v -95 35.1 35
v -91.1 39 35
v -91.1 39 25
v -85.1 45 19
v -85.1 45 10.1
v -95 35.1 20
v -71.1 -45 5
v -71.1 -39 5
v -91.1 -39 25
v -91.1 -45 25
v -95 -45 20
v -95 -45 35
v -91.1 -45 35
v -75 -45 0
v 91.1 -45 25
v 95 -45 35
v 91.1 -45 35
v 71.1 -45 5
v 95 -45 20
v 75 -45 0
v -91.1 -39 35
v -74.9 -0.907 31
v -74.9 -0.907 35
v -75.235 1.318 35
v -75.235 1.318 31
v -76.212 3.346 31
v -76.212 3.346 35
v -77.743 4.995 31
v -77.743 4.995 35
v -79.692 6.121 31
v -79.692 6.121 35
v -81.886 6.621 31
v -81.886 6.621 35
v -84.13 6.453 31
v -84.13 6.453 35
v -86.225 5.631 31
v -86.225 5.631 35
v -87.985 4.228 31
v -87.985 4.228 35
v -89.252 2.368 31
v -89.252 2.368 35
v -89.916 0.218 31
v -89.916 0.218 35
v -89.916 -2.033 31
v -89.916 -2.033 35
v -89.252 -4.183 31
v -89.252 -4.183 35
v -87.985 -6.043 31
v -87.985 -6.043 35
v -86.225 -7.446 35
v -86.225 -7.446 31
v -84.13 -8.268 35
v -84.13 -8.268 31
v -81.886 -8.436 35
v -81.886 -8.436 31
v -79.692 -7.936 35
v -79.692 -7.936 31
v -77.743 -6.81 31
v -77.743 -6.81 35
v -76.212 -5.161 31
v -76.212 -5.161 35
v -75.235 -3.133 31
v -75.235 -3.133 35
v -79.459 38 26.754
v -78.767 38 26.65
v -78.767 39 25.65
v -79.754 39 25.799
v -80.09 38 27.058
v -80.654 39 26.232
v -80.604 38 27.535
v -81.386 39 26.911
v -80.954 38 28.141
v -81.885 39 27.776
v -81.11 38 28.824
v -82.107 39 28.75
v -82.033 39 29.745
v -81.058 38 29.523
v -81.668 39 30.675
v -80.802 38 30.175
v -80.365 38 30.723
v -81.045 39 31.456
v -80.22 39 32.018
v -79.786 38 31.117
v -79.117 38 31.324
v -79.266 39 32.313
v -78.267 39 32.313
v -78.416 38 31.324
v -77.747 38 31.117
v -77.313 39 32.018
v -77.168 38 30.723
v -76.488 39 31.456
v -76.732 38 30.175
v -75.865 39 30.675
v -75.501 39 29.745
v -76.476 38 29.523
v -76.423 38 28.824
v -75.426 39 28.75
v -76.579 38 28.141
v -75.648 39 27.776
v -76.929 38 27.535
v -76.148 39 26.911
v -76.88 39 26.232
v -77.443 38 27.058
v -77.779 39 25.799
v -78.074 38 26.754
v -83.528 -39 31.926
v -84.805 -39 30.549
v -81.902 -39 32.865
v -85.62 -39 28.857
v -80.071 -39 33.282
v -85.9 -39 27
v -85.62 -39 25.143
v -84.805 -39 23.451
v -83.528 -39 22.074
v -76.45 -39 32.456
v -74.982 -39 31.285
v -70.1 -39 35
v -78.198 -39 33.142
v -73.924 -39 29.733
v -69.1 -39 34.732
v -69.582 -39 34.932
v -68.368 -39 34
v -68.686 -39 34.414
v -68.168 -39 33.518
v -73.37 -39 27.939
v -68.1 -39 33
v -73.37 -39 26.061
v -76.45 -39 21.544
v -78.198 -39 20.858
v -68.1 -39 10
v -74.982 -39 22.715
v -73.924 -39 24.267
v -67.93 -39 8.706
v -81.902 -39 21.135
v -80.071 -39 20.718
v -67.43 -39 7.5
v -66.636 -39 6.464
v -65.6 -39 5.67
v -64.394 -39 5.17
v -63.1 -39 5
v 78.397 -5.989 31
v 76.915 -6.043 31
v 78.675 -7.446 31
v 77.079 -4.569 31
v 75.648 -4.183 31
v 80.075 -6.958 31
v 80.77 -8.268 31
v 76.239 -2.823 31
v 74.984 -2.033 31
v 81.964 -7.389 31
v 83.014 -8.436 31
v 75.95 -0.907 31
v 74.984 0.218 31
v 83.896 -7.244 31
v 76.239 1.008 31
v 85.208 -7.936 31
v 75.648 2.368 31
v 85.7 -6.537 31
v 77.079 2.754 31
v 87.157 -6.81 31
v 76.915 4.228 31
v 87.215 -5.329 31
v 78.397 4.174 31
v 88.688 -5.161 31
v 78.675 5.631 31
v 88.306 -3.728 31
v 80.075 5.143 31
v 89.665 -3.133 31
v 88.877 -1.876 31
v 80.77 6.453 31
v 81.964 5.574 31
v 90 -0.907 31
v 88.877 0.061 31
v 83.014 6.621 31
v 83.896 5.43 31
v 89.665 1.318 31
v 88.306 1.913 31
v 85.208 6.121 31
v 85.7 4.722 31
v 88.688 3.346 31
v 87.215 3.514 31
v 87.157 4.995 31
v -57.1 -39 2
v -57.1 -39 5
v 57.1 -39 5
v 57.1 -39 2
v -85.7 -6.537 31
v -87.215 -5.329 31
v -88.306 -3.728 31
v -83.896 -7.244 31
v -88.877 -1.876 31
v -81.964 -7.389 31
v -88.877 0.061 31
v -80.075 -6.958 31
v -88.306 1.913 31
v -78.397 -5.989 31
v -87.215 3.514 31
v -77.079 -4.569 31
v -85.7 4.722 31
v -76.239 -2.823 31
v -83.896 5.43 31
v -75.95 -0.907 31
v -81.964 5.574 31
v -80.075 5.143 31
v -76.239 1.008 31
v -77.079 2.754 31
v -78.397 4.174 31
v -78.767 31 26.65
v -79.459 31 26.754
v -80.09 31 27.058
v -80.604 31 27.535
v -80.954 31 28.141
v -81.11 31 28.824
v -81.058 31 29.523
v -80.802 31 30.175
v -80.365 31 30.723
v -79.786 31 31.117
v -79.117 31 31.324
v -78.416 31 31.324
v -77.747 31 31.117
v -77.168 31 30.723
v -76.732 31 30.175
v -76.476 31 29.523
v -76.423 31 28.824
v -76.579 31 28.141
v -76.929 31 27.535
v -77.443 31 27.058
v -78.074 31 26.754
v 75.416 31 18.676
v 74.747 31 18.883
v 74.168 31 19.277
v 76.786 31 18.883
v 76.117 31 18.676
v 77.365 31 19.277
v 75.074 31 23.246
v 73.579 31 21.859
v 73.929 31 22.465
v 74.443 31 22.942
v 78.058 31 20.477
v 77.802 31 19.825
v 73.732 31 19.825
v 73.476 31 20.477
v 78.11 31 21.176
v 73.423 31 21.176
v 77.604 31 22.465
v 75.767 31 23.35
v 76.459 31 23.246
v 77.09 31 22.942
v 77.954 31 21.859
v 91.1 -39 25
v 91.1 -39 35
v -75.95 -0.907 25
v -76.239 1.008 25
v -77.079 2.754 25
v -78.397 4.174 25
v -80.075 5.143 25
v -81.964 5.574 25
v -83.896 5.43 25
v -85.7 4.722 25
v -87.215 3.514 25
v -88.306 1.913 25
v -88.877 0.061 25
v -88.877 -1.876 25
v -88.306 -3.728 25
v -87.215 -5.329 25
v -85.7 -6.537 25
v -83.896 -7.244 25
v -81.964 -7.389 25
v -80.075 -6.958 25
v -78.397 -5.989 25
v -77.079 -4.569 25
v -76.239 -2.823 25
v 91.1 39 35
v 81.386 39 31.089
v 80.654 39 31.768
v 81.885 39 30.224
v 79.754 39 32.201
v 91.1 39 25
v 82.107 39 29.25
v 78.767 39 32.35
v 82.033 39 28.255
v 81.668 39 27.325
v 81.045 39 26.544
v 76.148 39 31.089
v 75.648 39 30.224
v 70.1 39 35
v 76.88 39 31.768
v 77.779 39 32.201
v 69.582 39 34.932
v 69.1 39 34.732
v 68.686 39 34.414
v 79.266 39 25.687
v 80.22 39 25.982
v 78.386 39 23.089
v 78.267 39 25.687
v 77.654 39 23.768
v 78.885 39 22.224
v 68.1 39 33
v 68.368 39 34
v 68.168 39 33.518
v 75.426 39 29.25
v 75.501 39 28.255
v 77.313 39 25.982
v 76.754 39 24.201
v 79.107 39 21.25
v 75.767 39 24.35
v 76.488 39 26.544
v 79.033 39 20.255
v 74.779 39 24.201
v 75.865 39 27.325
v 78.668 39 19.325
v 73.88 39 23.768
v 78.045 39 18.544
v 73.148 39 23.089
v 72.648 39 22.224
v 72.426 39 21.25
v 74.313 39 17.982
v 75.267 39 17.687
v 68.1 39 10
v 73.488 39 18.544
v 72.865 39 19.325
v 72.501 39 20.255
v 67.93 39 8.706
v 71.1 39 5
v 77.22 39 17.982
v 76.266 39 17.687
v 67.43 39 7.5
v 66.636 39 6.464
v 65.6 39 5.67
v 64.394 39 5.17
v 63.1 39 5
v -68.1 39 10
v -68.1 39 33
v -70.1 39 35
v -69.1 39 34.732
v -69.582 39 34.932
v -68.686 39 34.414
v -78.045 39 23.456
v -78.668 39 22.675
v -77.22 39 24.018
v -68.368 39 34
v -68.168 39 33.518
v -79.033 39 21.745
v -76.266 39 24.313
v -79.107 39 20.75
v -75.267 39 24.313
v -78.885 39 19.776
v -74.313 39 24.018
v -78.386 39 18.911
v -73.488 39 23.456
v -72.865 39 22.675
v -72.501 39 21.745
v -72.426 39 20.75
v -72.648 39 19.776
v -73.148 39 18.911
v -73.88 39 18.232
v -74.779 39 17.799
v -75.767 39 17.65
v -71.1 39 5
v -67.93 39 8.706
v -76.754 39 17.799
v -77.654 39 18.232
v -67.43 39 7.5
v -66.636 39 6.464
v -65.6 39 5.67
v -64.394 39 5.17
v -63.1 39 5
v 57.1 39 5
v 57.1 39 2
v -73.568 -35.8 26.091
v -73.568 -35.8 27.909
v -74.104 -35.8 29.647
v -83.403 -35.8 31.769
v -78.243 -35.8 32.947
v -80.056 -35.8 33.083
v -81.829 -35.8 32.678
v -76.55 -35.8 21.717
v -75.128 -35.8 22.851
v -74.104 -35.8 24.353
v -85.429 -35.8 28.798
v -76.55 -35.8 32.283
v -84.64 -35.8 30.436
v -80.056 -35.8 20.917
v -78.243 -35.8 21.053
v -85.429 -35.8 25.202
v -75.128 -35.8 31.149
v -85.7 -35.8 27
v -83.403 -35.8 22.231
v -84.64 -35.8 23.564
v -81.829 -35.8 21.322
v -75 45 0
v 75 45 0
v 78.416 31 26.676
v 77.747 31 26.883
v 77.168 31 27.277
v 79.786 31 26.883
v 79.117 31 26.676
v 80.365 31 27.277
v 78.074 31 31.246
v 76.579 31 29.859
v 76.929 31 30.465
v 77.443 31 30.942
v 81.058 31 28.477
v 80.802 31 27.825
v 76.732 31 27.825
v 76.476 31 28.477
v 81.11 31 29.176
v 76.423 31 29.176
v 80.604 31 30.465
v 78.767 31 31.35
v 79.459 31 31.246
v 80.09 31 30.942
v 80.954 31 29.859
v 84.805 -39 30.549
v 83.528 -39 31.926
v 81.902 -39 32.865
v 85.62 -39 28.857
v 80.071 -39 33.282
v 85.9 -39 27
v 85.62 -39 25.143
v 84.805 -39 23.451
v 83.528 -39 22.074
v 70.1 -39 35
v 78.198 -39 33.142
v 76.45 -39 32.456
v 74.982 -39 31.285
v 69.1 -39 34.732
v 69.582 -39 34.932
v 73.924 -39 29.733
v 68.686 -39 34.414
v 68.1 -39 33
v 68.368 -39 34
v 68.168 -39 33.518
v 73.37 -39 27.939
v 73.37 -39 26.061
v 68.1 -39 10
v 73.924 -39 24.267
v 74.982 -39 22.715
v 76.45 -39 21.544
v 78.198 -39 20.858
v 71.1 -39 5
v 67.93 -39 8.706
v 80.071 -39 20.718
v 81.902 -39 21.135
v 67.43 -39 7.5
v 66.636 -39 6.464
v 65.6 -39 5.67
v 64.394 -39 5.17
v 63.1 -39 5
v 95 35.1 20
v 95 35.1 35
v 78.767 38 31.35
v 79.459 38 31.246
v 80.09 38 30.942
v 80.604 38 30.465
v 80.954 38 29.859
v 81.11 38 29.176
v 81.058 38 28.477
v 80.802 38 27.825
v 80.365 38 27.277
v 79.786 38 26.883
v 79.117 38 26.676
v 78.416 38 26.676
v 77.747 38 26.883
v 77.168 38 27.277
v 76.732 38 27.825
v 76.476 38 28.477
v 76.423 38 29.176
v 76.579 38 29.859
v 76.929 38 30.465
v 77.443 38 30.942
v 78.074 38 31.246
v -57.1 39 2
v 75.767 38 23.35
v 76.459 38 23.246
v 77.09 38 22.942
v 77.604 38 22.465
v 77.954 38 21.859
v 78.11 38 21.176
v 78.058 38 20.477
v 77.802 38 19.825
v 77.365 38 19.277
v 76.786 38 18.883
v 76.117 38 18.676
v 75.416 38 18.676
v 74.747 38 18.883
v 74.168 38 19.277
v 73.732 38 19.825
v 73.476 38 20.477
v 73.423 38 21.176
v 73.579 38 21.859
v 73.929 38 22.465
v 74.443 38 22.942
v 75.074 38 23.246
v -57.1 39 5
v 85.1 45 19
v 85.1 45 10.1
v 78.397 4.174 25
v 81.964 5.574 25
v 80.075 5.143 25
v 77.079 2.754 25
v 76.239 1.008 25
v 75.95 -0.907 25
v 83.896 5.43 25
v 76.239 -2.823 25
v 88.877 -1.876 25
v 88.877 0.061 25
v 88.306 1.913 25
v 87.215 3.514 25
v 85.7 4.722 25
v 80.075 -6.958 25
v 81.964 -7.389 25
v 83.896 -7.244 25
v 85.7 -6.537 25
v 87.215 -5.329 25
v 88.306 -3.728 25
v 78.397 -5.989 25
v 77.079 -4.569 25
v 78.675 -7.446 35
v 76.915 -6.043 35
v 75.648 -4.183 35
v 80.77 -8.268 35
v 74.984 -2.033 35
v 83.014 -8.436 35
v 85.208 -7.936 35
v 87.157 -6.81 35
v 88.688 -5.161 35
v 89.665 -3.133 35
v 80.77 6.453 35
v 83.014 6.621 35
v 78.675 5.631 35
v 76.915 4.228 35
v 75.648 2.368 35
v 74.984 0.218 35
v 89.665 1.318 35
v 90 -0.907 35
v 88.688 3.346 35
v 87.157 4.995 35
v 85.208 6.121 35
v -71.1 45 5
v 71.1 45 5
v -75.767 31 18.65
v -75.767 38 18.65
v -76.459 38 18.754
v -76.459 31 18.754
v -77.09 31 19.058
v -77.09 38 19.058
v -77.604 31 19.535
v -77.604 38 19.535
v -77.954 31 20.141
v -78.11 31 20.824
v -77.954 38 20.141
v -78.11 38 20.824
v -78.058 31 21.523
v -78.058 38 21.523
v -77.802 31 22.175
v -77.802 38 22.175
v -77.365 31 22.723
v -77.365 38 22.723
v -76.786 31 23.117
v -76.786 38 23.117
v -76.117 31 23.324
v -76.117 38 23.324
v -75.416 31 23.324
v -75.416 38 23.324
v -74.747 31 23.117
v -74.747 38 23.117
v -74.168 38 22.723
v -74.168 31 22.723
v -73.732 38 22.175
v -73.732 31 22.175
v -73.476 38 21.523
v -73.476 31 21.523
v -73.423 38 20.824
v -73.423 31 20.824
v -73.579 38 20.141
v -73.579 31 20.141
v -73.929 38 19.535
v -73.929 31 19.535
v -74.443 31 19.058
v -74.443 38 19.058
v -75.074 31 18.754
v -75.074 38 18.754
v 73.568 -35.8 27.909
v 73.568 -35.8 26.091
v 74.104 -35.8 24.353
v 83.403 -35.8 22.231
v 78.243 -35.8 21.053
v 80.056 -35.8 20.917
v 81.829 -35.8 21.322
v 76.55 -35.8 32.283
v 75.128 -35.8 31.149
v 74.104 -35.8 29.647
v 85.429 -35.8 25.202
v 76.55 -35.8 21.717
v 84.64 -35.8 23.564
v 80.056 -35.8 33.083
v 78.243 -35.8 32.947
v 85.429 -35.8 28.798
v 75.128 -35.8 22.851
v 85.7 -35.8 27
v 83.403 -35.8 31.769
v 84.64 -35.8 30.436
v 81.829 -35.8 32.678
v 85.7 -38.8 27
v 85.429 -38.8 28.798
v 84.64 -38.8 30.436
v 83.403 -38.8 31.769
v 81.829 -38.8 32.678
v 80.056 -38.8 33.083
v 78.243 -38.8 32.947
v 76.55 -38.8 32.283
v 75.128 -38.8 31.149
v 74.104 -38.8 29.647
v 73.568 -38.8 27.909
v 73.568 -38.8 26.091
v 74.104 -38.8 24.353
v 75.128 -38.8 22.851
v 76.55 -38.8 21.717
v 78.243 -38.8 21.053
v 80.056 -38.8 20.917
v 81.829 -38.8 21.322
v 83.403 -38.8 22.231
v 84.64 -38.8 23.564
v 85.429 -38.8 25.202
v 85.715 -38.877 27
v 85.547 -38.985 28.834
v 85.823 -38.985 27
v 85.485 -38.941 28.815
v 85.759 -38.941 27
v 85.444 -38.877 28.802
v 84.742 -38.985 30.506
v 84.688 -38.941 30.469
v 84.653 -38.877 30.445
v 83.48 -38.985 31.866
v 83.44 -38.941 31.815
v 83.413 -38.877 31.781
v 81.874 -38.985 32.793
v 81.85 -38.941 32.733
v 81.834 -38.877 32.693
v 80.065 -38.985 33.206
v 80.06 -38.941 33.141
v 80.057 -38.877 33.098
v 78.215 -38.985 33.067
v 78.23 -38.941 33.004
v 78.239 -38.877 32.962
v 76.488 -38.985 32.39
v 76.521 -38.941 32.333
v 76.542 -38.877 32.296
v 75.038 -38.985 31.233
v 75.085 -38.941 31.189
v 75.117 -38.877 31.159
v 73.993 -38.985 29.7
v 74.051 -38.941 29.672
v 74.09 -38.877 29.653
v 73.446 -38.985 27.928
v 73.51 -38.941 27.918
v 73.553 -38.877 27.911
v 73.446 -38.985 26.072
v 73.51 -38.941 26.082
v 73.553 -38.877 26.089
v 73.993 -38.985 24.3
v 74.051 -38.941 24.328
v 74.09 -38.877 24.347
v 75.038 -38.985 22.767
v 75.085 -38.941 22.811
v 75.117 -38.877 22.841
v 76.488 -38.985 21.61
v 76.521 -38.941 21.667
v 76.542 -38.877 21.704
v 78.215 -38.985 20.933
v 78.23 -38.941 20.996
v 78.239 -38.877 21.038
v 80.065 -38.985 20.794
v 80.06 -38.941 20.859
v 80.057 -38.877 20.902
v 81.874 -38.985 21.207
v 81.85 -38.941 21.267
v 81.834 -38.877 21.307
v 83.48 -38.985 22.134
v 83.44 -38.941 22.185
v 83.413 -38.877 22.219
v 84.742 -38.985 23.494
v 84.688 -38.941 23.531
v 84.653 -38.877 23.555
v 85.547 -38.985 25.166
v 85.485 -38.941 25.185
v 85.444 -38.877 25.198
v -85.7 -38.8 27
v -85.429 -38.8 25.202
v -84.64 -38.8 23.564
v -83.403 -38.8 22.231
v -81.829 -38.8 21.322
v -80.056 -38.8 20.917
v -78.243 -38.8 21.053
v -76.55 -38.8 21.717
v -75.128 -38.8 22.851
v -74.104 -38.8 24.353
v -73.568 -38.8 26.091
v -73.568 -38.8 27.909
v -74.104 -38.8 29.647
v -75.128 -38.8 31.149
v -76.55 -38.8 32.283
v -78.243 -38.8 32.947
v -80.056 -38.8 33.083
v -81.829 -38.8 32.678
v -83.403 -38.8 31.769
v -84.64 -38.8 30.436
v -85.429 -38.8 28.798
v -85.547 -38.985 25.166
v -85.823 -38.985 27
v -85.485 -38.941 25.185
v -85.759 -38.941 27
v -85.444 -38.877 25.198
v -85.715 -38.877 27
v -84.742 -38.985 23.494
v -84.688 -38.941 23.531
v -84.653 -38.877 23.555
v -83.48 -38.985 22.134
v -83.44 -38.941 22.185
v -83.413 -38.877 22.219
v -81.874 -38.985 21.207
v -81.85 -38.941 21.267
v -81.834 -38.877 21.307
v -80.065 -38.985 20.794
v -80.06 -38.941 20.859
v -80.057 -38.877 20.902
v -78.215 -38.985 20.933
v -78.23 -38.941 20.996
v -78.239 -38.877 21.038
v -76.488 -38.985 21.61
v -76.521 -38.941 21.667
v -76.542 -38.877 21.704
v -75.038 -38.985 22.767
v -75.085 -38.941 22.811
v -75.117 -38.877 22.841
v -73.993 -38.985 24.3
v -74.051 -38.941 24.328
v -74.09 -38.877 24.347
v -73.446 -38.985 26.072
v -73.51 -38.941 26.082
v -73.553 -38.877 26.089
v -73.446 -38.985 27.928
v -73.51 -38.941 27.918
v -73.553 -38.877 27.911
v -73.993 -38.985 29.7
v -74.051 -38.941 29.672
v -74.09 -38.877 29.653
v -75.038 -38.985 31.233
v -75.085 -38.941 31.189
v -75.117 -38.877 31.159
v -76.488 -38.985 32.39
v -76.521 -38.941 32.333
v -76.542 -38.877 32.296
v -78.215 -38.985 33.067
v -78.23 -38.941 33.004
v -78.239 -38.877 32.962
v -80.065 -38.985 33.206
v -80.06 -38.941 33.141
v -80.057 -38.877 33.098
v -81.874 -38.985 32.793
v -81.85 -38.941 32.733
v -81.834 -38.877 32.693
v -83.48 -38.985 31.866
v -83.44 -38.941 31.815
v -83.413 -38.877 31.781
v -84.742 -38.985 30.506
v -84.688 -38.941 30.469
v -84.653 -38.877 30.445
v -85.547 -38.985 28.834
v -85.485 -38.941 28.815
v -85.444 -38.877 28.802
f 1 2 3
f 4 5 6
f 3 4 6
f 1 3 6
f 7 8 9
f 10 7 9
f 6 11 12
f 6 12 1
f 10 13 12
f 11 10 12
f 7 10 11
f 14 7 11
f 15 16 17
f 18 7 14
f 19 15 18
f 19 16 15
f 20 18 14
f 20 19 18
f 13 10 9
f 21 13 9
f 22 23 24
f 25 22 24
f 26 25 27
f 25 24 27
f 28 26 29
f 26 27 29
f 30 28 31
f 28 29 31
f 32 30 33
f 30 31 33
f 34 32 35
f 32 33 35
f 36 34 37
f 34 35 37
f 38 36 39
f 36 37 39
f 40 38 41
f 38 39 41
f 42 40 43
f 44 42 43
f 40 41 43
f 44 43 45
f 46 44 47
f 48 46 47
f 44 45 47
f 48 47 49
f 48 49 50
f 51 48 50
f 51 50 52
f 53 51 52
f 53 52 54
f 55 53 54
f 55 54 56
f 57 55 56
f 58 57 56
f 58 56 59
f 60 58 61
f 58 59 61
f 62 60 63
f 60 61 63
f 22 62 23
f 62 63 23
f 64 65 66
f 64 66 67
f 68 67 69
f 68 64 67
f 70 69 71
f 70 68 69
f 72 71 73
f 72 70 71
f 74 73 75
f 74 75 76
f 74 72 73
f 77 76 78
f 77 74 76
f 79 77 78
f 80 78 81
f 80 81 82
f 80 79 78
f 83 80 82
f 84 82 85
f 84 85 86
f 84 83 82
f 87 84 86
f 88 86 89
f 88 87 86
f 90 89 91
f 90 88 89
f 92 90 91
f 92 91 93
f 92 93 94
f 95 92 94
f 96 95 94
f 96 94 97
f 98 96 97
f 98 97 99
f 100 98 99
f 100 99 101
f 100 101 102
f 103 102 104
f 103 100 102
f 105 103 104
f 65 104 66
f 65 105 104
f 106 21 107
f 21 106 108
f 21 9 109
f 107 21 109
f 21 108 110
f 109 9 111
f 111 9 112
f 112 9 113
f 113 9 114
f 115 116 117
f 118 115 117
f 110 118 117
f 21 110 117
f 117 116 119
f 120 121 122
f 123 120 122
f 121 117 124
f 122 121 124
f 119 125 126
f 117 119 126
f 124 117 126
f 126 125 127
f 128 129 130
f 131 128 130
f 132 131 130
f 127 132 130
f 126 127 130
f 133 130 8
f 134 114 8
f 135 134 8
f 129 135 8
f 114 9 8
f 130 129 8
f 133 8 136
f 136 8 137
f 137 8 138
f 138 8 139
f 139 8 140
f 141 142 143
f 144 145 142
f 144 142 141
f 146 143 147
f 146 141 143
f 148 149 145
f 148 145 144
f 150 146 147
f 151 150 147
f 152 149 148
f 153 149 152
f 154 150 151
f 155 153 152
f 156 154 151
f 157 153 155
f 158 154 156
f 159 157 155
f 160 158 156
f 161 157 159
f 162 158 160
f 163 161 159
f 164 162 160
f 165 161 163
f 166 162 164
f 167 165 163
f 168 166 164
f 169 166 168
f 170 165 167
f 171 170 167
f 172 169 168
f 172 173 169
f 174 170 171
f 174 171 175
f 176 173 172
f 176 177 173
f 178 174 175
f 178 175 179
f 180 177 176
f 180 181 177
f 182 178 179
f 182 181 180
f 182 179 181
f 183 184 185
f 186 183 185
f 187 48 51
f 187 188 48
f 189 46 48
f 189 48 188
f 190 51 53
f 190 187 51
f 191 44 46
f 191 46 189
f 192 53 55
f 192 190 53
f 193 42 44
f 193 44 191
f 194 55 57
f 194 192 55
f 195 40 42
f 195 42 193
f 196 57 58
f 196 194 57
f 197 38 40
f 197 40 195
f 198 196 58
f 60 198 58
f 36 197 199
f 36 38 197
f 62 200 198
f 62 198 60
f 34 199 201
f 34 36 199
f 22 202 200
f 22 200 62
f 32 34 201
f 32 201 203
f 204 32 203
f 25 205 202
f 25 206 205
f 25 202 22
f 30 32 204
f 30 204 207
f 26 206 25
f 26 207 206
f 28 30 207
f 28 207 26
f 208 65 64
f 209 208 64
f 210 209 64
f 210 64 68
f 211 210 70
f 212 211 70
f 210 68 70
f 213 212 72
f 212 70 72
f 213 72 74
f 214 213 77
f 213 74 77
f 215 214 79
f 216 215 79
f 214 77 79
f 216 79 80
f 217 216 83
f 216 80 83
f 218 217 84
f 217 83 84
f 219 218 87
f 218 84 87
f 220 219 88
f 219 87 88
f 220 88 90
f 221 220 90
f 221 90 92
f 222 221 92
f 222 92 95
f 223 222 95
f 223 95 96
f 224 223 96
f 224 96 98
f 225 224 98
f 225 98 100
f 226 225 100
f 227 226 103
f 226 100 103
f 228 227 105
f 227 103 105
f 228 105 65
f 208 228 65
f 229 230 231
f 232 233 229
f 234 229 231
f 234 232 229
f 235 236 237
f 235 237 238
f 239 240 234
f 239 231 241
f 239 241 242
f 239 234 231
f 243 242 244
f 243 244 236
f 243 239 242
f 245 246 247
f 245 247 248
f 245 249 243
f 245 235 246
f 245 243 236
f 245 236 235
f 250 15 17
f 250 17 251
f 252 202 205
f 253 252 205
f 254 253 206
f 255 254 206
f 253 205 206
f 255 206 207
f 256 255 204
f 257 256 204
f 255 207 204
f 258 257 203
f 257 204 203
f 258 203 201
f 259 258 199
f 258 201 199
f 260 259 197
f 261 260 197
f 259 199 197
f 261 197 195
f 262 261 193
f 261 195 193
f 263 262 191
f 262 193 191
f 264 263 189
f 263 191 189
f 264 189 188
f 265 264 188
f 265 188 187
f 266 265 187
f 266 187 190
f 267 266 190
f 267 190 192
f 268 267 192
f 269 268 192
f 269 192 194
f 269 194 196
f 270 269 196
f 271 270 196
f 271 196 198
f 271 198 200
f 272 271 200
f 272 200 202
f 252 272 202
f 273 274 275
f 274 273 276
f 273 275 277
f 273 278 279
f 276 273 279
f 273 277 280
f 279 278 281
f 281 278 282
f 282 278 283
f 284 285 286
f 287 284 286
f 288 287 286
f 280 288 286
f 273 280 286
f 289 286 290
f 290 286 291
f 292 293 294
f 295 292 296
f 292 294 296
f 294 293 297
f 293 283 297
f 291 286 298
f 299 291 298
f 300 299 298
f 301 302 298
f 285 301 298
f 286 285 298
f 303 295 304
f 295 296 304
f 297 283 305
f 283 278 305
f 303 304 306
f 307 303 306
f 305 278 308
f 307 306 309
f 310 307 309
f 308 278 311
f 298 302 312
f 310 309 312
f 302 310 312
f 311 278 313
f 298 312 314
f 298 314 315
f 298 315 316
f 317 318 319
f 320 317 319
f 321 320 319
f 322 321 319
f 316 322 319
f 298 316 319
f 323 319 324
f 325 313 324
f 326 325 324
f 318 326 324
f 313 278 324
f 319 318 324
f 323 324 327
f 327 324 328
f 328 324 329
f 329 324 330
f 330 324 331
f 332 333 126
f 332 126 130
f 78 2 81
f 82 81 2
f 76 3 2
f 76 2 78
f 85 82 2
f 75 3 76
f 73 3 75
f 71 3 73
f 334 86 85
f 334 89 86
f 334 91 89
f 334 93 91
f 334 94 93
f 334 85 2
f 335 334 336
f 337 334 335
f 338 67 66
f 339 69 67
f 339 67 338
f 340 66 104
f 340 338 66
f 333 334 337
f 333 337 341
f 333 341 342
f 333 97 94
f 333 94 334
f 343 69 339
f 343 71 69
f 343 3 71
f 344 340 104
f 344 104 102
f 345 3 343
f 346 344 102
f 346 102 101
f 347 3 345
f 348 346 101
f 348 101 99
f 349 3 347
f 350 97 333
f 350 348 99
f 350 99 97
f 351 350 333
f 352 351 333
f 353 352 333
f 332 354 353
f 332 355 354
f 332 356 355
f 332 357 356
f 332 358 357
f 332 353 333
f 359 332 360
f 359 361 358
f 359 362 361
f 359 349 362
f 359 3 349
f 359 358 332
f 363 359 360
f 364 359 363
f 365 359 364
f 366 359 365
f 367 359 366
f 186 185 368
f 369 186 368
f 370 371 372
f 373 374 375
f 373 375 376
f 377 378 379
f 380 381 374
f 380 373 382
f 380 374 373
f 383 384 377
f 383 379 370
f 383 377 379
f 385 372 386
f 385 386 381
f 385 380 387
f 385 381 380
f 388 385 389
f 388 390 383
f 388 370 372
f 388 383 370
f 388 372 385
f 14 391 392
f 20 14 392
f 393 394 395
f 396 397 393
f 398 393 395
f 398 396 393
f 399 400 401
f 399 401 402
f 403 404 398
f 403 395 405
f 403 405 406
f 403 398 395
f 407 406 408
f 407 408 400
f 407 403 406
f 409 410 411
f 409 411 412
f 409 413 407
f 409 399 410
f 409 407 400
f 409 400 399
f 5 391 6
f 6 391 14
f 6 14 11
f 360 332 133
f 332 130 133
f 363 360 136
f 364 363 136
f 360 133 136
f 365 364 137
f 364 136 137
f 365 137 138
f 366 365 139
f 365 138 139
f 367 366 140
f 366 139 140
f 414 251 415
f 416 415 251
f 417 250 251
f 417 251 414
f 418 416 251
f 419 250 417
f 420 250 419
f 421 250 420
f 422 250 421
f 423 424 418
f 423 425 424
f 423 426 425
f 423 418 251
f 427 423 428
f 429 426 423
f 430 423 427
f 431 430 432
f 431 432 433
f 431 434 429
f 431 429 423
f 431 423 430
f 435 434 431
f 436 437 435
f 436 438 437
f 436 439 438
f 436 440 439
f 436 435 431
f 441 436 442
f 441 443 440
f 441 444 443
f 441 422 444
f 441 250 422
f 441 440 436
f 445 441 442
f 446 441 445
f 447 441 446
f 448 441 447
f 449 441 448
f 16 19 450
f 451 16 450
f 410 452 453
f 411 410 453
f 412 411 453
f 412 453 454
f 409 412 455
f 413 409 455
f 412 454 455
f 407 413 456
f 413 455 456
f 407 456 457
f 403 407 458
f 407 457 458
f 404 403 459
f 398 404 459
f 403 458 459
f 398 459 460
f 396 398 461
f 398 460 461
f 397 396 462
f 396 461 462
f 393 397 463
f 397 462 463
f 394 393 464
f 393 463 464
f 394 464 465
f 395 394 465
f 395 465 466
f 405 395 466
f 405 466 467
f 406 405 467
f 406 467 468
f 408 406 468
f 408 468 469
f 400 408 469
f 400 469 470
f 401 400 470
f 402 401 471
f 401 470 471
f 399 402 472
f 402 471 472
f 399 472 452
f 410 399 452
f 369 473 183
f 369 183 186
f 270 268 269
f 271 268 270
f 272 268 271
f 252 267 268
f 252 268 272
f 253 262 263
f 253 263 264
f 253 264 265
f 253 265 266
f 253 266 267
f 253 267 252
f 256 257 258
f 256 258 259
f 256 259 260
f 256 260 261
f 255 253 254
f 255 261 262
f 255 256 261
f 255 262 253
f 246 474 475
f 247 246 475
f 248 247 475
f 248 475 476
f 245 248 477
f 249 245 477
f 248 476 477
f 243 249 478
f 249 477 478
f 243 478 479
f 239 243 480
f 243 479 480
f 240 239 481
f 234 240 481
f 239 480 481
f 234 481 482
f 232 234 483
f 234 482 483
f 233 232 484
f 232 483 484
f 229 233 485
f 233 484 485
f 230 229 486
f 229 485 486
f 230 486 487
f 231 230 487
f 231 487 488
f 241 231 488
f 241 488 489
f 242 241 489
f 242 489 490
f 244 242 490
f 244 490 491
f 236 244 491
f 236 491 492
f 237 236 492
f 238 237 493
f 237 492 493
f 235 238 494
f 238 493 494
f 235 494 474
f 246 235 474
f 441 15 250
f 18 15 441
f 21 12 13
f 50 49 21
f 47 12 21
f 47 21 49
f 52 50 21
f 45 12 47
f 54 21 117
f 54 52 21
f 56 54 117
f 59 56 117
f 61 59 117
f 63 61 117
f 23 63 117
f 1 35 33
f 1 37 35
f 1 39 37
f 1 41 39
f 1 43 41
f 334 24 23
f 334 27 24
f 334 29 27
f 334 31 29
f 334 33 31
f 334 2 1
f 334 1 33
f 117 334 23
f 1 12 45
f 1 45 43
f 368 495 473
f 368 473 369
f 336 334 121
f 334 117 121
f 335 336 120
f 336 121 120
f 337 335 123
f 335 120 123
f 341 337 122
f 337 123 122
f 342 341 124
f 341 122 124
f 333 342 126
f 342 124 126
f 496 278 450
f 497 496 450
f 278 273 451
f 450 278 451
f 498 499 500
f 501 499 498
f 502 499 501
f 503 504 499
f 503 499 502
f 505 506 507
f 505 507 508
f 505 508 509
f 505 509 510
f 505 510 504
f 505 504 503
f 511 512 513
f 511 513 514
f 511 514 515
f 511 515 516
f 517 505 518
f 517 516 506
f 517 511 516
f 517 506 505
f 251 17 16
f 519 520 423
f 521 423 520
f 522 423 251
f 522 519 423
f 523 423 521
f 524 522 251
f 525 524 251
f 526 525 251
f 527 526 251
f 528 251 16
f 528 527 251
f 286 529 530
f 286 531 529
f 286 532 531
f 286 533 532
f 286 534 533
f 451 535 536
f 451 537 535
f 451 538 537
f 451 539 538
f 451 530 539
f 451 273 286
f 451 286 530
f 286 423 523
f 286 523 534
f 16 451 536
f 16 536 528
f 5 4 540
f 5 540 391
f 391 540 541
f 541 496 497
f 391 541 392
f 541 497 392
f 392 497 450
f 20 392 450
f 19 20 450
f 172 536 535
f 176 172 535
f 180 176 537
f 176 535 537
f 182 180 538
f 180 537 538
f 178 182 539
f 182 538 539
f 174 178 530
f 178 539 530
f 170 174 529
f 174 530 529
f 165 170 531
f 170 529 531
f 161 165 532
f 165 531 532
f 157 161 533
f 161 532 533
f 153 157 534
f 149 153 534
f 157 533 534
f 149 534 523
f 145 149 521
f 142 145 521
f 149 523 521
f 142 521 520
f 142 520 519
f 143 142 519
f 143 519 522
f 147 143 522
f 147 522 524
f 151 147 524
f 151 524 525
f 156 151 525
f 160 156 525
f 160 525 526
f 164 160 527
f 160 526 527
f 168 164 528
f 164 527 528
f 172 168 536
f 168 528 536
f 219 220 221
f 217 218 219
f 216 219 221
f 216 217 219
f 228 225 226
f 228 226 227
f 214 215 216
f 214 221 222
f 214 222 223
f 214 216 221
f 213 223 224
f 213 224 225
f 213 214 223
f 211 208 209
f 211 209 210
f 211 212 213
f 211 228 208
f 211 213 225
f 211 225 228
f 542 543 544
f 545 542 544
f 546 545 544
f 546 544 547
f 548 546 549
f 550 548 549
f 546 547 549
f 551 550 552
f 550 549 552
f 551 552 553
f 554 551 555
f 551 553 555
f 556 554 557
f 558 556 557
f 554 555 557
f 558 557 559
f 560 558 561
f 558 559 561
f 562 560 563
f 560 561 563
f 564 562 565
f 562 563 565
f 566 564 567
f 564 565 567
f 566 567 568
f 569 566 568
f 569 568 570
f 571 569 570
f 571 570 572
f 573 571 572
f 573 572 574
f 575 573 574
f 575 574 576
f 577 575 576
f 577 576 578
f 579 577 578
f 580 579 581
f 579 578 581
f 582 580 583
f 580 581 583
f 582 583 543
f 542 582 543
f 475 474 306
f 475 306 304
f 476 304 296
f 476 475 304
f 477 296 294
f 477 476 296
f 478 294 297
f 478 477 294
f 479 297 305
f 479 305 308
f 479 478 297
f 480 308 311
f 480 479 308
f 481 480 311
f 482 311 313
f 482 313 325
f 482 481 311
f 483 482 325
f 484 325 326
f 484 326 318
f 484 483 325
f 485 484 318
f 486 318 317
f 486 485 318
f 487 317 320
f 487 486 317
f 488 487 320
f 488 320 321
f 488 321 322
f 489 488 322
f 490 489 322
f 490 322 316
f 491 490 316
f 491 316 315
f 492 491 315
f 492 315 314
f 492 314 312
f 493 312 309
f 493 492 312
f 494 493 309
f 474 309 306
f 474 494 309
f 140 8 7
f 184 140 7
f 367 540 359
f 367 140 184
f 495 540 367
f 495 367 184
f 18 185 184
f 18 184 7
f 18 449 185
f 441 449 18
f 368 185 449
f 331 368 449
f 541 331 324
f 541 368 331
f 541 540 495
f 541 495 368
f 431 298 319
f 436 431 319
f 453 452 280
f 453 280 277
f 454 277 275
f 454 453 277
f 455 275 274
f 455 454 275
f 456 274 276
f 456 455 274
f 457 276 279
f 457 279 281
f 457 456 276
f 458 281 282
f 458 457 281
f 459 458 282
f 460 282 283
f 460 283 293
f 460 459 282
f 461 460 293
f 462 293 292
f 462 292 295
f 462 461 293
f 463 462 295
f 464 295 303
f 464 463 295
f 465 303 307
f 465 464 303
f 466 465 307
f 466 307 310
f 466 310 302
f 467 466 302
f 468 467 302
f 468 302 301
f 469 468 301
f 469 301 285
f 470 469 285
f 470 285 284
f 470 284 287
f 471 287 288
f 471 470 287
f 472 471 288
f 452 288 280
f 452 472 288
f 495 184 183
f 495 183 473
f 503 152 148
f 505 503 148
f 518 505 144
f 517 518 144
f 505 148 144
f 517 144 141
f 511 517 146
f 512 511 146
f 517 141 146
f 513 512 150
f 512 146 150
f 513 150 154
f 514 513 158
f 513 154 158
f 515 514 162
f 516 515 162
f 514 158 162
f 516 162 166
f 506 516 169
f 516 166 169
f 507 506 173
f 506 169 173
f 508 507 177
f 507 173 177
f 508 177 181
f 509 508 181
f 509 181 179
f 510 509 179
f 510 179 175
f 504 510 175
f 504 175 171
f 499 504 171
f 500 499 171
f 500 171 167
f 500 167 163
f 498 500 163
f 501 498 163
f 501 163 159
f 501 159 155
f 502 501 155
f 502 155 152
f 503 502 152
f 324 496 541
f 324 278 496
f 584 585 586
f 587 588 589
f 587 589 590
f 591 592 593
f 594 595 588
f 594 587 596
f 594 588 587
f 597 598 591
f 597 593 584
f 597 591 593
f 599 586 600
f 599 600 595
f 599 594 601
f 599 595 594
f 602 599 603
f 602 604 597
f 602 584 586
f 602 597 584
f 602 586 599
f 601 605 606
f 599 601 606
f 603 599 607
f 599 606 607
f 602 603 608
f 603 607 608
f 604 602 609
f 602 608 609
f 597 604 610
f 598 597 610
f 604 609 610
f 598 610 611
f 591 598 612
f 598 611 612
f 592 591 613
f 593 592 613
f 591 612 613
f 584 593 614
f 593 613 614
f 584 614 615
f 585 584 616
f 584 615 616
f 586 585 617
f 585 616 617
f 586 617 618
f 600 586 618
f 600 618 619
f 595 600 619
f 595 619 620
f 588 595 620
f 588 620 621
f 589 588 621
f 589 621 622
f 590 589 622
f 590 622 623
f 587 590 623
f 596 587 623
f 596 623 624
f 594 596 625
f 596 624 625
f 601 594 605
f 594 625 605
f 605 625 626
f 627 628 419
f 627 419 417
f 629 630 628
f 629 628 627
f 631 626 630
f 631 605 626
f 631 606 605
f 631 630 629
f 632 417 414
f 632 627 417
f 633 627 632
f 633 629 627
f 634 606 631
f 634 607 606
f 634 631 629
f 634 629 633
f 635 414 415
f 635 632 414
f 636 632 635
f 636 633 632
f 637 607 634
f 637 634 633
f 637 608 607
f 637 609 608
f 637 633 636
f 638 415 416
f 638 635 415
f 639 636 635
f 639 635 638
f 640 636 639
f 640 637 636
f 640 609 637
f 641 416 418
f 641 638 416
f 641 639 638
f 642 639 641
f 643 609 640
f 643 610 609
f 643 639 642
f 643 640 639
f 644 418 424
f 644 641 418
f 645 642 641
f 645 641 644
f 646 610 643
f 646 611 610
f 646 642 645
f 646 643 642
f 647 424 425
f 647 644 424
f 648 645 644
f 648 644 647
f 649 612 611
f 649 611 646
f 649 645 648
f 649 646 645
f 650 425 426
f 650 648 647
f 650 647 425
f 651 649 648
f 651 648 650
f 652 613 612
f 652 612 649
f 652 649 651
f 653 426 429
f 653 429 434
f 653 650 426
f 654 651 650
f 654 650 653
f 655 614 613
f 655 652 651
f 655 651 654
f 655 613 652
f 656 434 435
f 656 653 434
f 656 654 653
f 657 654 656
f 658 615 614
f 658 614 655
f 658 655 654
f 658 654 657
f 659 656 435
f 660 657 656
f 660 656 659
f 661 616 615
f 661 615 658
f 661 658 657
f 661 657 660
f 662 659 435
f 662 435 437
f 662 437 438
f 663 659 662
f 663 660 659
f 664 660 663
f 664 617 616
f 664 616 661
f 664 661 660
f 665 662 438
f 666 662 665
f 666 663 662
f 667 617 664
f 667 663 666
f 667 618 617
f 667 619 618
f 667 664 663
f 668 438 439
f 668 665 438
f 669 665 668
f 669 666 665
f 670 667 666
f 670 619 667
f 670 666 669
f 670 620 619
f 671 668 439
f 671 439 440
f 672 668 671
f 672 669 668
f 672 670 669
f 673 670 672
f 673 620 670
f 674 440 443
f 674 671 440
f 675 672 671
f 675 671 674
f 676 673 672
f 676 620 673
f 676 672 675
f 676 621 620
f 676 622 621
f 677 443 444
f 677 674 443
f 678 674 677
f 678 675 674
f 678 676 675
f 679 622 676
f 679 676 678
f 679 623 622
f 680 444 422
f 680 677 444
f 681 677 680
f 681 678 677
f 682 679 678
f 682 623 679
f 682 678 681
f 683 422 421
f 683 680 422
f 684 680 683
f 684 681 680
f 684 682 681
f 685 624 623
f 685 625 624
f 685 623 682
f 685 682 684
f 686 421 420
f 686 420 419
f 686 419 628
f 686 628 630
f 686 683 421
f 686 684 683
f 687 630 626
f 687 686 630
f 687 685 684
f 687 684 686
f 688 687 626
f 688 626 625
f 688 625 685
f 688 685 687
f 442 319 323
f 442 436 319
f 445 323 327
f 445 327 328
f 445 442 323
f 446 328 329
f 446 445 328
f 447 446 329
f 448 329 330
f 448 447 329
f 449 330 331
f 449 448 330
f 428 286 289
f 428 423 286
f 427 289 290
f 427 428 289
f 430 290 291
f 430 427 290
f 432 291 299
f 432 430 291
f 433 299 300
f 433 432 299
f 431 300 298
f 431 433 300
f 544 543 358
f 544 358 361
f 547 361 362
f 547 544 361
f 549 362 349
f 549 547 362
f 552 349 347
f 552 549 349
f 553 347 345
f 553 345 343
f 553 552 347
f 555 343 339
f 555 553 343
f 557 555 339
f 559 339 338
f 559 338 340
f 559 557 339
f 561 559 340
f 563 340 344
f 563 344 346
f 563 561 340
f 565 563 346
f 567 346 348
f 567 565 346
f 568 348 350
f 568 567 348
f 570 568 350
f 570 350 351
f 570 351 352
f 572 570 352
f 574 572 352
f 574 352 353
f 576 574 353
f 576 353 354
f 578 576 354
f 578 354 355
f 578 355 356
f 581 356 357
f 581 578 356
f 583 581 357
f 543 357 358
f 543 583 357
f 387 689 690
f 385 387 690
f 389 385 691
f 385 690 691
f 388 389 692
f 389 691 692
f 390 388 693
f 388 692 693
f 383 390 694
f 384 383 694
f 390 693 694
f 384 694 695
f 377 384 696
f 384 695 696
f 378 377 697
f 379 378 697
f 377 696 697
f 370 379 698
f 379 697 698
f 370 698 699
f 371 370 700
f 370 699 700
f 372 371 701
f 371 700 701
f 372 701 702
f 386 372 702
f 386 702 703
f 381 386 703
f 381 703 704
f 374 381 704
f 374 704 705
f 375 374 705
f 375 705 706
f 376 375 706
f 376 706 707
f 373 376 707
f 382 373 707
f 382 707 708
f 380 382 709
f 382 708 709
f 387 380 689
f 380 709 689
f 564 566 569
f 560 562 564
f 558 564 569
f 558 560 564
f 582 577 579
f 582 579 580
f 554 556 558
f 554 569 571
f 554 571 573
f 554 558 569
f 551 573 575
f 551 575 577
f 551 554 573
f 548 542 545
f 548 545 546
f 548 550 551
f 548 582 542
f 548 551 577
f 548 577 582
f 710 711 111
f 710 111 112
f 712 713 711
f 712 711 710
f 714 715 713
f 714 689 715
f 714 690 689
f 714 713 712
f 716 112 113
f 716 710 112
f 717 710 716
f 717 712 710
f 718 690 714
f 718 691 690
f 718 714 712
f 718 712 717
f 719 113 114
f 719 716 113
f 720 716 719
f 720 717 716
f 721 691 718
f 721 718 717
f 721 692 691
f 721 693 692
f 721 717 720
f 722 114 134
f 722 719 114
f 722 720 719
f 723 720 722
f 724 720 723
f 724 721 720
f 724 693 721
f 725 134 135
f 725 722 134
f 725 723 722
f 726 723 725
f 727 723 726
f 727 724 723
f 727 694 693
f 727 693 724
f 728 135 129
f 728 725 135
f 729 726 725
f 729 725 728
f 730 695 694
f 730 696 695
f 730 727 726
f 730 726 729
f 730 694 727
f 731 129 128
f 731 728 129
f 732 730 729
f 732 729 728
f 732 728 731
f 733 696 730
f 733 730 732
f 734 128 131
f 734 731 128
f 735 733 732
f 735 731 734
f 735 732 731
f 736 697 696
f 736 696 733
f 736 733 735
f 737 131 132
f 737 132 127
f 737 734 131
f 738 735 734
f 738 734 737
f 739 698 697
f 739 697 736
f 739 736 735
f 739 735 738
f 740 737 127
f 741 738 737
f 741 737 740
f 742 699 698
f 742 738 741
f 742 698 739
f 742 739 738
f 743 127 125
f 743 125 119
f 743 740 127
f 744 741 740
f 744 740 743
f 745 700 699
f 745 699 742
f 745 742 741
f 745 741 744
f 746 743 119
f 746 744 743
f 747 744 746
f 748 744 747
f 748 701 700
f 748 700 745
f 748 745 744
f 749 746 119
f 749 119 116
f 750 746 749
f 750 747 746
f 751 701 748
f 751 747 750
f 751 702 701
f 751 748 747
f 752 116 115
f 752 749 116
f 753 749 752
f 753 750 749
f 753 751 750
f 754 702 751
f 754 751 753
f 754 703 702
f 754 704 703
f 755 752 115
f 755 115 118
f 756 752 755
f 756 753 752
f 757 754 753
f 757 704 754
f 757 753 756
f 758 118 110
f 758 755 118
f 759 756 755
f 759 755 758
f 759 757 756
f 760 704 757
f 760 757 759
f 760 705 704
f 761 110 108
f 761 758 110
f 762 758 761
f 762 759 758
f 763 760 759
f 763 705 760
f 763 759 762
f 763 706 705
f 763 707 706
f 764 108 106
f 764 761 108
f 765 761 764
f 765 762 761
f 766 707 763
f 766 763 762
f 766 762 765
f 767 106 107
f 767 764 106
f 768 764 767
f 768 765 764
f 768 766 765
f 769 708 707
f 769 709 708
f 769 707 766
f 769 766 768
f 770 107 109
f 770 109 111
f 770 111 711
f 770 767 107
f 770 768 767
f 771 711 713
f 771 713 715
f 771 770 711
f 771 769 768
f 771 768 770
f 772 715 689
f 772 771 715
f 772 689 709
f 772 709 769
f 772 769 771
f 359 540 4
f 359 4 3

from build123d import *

# Parameters (mm, degrees)
SKETCH1_W                      = 190
SKETCH1_H                      = 90
BOSS_EXTRUDE1_DEPTH            = 5
SKETCH2_W                      = 3.9
SKETCH2_H                      = 90
BOSS_EXTRUDE2_DEPTH            = 30
SKETCH3_W                      = 34
SKETCH3_H                      = 5
SKETCH3_W_2                    = 47
BOSS_EXTRUDE3_DEPTH            = 90
SKETCH4_W                      = 182.2
SKETCH4_H                      = 6
CUT_EXTRUDE1_DEPTH             = 5
CHAMFER6_SIZE                  = 20
BOSS_EXTRUDE4_DEPTH            = 78
FILLET5_R                      = 2
SKETCH9_R                      = 6.5
CUT_EXTRUDE4_DEPTH             = 10
SKETCH10_R                     = 7.55
CUT_EXTRUDE5_DEPTH             = 4
SKETCH15_R                     = 2.35
CUT_EXTRUDE7_DEPTH             = 8
CHAMFER7_SIZE                  = 1
SKETCH17_R                     = 6.1
CUT_EXTRUDE8_DEPTH             = 3.2
FILLET7_R                      = 0.2
CHAMFER8_SIZE                  = 9.9
CUT_EXTRUDE9_REACH             = 164.433
SKETCH18_W                     = 5
SKETCH18_H                     = 78
CUT_EXTRUDE9_DIRECTION_2_REACH = 164.433
BOSS_EXTRUDE5_DEPTH            = 78
FILLET8_R                      = 5
SKETCH21_W                     = 114.2
SKETCH21_H                     = 78
CUT_EXTRUDE10_DEPTH            = 3


with BuildPart() as part:
    # Sketch1 → Boss-Extrude1 (new body)
    with BuildSketch(Plane.XY):
        Rectangle(SKETCH1_W, SKETCH1_H)
    extrude(amount=BOSS_EXTRUDE1_DEPTH)

    # Sketch2 → Boss-Extrude2 (add)
    with BuildSketch(Plane.XY.offset(5)):
        with Locations((-93.05, 0)):
            Rectangle(SKETCH2_W, SKETCH2_H)
        with Locations((93.05, 0)):
            Rectangle(SKETCH2_W, SKETCH2_H)
    extrude(amount=BOSS_EXTRUDE2_DEPTH)

    # Sketch3 → Boss-Extrude3 (add)
    with BuildSketch(Plane(origin=(0, 45, 0), x_dir=(1, 0, 0), z_dir=(0, 1, 0))):
        with Locations((-74.1, -16.5)):
            Rectangle(SKETCH3_W, SKETCH3_H)
        with Locations((67.6, -16.5)):
            Rectangle(SKETCH3_W_2, SKETCH3_H)
    extrude(amount=-BOSS_EXTRUDE3_DEPTH)

    # Sketch4 → Cut-Extrude1 (cut)
    with BuildSketch(Plane.XY.offset(19)):
        with Locations((0, 42)):
            Rectangle(SKETCH4_W, SKETCH4_H)
        with Locations((0, -42)):
            Rectangle(SKETCH4_W, SKETCH4_H)
    extrude(amount=-CUT_EXTRUDE1_DEPTH, mode=Mode.SUBTRACT)

    # Chamfer6
    # the kernel refuses this chamfer: 20 mm, written as the material it adds along each edge
    with BuildSketch(Plane(origin=(-91.1, 45, 5), x_dir=(0.9996219169112968, 0, -0.02749587661058636), z_dir=(0, -1, 0))) as chamfer6_piece_1:
        Polygon((CHAMFER6_SIZE * 0.999621916911, CHAMFER6_SIZE * 0.0274958766106), (-CHAMFER6_SIZE * 0.0274958766106, CHAMFER6_SIZE * 0.999621916911), (0, 0), align=None)
    extrude(amount=90)
    with BuildSketch(Plane(origin=(91.1, -45, 5), x_dir=(0.027495876610586317, 0, 0.9996219169112968), z_dir=(0, 1, 0))) as chamfer6_piece_2:
        Polygon((CHAMFER6_SIZE * 0.999621916911, -CHAMFER6_SIZE * 0.0274958766106), (-CHAMFER6_SIZE * 0.0274958766106, -CHAMFER6_SIZE * 0.999621916911), (0, 0), align=None)
    extrude(amount=90)
    # the kernel refuses this chamfer: 20 mm, written as the material it takes off along each edge
    with BuildSketch(Plane(origin=(-95, -96.433659759, 0), x_dir=(0.9996219169112968, 0, -0.027495876610586372), z_dir=(0, 1, 0)), Plane(origin=(95, 96.433659759, 0), x_dir=(-0.9996219169112968, 0, -0.027495876610586372), z_dir=(0, -1, 0))) as chamfer6_2_piece_1:
        Polygon((CHAMFER6_SIZE * 0.999621916911, -CHAMFER6_SIZE * 0.0274958766106), (-CHAMFER6_SIZE * 0.0274958766106, -CHAMFER6_SIZE * 0.999621916911), (0, 0), align=None)
    extrude(amount=192.867319519, mode=Mode.SUBTRACT)

    # Sketch7 → Boss-Extrude4 (add)
    with BuildSketch(Plane(origin=(0, 39, 0), x_dir=(1, 0, 0), z_dir=(0, 1, 0))):
        Polygon((-85.1, -19), (-91.1, -25), (-91.1, -35), (-68.1, -35), (-68.1, -19), align=None)
        Polygon((68.1, -35), (68.1, -19), (85.1, -19), (91.1, -25), (91.1, -35), align=None)
    extrude(amount=-BOSS_EXTRUDE4_DEPTH)

    # Fillet5
    fillet5_edges = [part.edges().sort_by_distance(p)[0] for p in [
        (-68.1, 0, 35),
        (68.1, 0, 35),
    ]]
    fillet(fillet5_edges, radius=FILLET5_R)

    # Sketch9 → Cut-Extrude4 (cut)
    with BuildSketch(Plane.XY.offset(35)):
        with Locations((-82.45, -0.90743758)):
            Circle(SKETCH9_R)
        with Locations(Location((82.45, -0.90743758, 0), (0, 0, 180))):
            Circle(SKETCH9_R)
    extrude(amount=-CUT_EXTRUDE4_DEPTH, mode=Mode.SUBTRACT)

    # Sketch10 → Cut-Extrude5 (cut)
    with BuildSketch(Plane.XY.offset(35)):
        with Locations((-82.45, -0.90743758)):
            Circle(SKETCH10_R)
        with Locations((82.45, -0.90743758)):
            Circle(SKETCH10_R)
    extrude(amount=-CUT_EXTRUDE5_DEPTH, mode=Mode.SUBTRACT)

    # Sketch15 → Cut-Extrude7 (cut)
    with BuildSketch(Plane(origin=(0, 39, 0), x_dir=(1, 0, 0), z_dir=(0, 1, 0))):
        with Locations(Location((75.766666667, -21, 0), (0, 0, 270))):
            Circle(SKETCH15_R)
        with Locations(Location((-75.766666667, -21, 0), (0, 0, 90))):
            Circle(SKETCH15_R)
        with Locations(Location((78.766666667, -29, 0), (0, 0, 270))):
            Circle(SKETCH15_R)
        with Locations(Location((-78.766666667, -29, 0), (0, 0, 90))):
            Circle(SKETCH15_R)
    extrude(amount=-CUT_EXTRUDE7_DEPTH, mode=Mode.SUBTRACT)

    # Chamfer7
    chamfer7_edges = [part.edges().sort_by_distance(p)[0] for p in [
        (-75.766666667, 39, 23.35),
        (78.766666667, 39, 26.65),
        (-78.766666667, 39, 31.35),
        (75.766666667, 39, 18.65),
    ]]
    chamfer(chamfer7_edges, length=CHAMFER7_SIZE)

    # Sketch17 → Cut-Extrude8 (cut)
    with BuildSketch(Plane.XZ.offset(39)):
        with Locations((79.6, 27)):
            Circle(SKETCH17_R)
        with Locations(Location((-79.6, 27, 0), (0, 0, 180))):
            Circle(SKETCH17_R)
    extrude(amount=-CUT_EXTRUDE8_DEPTH, mode=Mode.SUBTRACT)

    # Fillet7
    fillet7_edges = [part.edges().sort_by_distance(p)[0] for p in [
        (73.5, -39, 27),
        (-73.5, -39, 27),
    ]]
    fillet(fillet7_edges, radius=FILLET7_R)

    # Chamfer8
    # the kernel refuses this chamfer: 9.9 mm, written as the material it takes off along each edge
    with BuildSketch(Plane(origin=(-95, 45, -5.459661581), x_dir=(0.9996219169112968, 0.027495876610586265, 0), z_dir=(0, 0, 1)), Plane(origin=(95, 45, 60.459661581), x_dir=(-0.9996219169112968, 0.02749587661058615, 0), z_dir=(0, 0, -1))) as chamfer8_piece_1:
        Polygon((CHAMFER8_SIZE * 0.999621916911, -CHAMFER8_SIZE * 0.0274958766106), (-CHAMFER8_SIZE * 0.0274958766106, -CHAMFER8_SIZE * 0.999621916911), (0, 0), align=None)
    extrude(amount=65.919323162, mode=Mode.SUBTRACT)

    # Cut-Extrude9: up to this face of the body (flat: up to its plane)
    cut_extrude9_end = Plane(part.part.faces().sort_by_distance((-68.1, 0, 26))[0])
    # Sketch18 → Cut-Extrude9 (cut, up to the picked face)
    with BuildSketch(Plane(origin=(-57.1, 0, 0), x_dir=(0, 0, -1), z_dir=(1, 0, 0)), mode=Mode.PRIVATE) as cut_extrude9_sk1:
        with Locations((-16.5, 0)):
            Rectangle(SKETCH18_W, SKETCH18_H)
    cut_extrude9_tool1 = split(extrude(cut_extrude9_sk1.sketch, amount=-CUT_EXTRUDE9_REACH, mode=Mode.PRIVATE), bisect_by=cut_extrude9_end, keep=Keep.BOTH, mode=Mode.PRIVATE)
    add(cut_extrude9_tool1.solids().sort_by(Axis((-57.1, 0, 16.5), (-1, 0, 0)))[0], mode=Mode.SUBTRACT)

    # Cut-Extrude9 direction 2: up to this face of the body (flat: up to its plane)
    cut_extrude9_direction_2_end = Plane(part.part.faces().sort_by_distance((68.1, 0, 26))[0])
    # Sketch18 → Cut-Extrude9 direction 2 (cut, up to the picked face)
    with BuildSketch(Plane(origin=(-57.1, 0, 0), x_dir=(0, 0, -1), z_dir=(1, 0, 0)), mode=Mode.PRIVATE) as cut_extrude9_direction_2_sk1:
        with Locations((-16.5, 0)):
            Rectangle(SKETCH18_W, SKETCH18_H)
    cut_extrude9_direction_2_tool1 = split(extrude(cut_extrude9_direction_2_sk1.sketch, amount=CUT_EXTRUDE9_DIRECTION_2_REACH, mode=Mode.PRIVATE), bisect_by=cut_extrude9_direction_2_end, keep=Keep.BOTH, mode=Mode.PRIVATE)
    add(cut_extrude9_direction_2_tool1.solids().sort_by(Axis((-57.1, 0, 16.5), (1, 0, 0)))[0], mode=Mode.SUBTRACT)

    # Sketch20 → Boss-Extrude5 (add)
    with BuildSketch(Plane(origin=(0, 39, 0), x_dir=(1, 0, 0), z_dir=(0, 1, 0))):
        Polygon((-68.1, -14), (-68.1, -5), (-71.1, -5), (-80.1, -14), align=None)
        Polygon((71.1, -5), (80.1, -14), (68.1, -14), (68.1, -5), align=None)
    extrude(amount=-BOSS_EXTRUDE5_DEPTH)

    # Fillet8
    fillet8_edges = [part.edges().sort_by_distance(p)[0] for p in [
        (-68.1, 0, 5),
        (68.1, 0, 5),
    ]]
    fillet(fillet8_edges, radius=FILLET8_R)

    # Sketch21 → Cut-Extrude10 (cut)
    with BuildSketch(Plane.XY.offset(5)):
        Rectangle(SKETCH21_W, SKETCH21_H)
    extrude(amount=-CUT_EXTRUDE10_DEPTH, mode=Mode.SUBTRACT)


solid = part.part
